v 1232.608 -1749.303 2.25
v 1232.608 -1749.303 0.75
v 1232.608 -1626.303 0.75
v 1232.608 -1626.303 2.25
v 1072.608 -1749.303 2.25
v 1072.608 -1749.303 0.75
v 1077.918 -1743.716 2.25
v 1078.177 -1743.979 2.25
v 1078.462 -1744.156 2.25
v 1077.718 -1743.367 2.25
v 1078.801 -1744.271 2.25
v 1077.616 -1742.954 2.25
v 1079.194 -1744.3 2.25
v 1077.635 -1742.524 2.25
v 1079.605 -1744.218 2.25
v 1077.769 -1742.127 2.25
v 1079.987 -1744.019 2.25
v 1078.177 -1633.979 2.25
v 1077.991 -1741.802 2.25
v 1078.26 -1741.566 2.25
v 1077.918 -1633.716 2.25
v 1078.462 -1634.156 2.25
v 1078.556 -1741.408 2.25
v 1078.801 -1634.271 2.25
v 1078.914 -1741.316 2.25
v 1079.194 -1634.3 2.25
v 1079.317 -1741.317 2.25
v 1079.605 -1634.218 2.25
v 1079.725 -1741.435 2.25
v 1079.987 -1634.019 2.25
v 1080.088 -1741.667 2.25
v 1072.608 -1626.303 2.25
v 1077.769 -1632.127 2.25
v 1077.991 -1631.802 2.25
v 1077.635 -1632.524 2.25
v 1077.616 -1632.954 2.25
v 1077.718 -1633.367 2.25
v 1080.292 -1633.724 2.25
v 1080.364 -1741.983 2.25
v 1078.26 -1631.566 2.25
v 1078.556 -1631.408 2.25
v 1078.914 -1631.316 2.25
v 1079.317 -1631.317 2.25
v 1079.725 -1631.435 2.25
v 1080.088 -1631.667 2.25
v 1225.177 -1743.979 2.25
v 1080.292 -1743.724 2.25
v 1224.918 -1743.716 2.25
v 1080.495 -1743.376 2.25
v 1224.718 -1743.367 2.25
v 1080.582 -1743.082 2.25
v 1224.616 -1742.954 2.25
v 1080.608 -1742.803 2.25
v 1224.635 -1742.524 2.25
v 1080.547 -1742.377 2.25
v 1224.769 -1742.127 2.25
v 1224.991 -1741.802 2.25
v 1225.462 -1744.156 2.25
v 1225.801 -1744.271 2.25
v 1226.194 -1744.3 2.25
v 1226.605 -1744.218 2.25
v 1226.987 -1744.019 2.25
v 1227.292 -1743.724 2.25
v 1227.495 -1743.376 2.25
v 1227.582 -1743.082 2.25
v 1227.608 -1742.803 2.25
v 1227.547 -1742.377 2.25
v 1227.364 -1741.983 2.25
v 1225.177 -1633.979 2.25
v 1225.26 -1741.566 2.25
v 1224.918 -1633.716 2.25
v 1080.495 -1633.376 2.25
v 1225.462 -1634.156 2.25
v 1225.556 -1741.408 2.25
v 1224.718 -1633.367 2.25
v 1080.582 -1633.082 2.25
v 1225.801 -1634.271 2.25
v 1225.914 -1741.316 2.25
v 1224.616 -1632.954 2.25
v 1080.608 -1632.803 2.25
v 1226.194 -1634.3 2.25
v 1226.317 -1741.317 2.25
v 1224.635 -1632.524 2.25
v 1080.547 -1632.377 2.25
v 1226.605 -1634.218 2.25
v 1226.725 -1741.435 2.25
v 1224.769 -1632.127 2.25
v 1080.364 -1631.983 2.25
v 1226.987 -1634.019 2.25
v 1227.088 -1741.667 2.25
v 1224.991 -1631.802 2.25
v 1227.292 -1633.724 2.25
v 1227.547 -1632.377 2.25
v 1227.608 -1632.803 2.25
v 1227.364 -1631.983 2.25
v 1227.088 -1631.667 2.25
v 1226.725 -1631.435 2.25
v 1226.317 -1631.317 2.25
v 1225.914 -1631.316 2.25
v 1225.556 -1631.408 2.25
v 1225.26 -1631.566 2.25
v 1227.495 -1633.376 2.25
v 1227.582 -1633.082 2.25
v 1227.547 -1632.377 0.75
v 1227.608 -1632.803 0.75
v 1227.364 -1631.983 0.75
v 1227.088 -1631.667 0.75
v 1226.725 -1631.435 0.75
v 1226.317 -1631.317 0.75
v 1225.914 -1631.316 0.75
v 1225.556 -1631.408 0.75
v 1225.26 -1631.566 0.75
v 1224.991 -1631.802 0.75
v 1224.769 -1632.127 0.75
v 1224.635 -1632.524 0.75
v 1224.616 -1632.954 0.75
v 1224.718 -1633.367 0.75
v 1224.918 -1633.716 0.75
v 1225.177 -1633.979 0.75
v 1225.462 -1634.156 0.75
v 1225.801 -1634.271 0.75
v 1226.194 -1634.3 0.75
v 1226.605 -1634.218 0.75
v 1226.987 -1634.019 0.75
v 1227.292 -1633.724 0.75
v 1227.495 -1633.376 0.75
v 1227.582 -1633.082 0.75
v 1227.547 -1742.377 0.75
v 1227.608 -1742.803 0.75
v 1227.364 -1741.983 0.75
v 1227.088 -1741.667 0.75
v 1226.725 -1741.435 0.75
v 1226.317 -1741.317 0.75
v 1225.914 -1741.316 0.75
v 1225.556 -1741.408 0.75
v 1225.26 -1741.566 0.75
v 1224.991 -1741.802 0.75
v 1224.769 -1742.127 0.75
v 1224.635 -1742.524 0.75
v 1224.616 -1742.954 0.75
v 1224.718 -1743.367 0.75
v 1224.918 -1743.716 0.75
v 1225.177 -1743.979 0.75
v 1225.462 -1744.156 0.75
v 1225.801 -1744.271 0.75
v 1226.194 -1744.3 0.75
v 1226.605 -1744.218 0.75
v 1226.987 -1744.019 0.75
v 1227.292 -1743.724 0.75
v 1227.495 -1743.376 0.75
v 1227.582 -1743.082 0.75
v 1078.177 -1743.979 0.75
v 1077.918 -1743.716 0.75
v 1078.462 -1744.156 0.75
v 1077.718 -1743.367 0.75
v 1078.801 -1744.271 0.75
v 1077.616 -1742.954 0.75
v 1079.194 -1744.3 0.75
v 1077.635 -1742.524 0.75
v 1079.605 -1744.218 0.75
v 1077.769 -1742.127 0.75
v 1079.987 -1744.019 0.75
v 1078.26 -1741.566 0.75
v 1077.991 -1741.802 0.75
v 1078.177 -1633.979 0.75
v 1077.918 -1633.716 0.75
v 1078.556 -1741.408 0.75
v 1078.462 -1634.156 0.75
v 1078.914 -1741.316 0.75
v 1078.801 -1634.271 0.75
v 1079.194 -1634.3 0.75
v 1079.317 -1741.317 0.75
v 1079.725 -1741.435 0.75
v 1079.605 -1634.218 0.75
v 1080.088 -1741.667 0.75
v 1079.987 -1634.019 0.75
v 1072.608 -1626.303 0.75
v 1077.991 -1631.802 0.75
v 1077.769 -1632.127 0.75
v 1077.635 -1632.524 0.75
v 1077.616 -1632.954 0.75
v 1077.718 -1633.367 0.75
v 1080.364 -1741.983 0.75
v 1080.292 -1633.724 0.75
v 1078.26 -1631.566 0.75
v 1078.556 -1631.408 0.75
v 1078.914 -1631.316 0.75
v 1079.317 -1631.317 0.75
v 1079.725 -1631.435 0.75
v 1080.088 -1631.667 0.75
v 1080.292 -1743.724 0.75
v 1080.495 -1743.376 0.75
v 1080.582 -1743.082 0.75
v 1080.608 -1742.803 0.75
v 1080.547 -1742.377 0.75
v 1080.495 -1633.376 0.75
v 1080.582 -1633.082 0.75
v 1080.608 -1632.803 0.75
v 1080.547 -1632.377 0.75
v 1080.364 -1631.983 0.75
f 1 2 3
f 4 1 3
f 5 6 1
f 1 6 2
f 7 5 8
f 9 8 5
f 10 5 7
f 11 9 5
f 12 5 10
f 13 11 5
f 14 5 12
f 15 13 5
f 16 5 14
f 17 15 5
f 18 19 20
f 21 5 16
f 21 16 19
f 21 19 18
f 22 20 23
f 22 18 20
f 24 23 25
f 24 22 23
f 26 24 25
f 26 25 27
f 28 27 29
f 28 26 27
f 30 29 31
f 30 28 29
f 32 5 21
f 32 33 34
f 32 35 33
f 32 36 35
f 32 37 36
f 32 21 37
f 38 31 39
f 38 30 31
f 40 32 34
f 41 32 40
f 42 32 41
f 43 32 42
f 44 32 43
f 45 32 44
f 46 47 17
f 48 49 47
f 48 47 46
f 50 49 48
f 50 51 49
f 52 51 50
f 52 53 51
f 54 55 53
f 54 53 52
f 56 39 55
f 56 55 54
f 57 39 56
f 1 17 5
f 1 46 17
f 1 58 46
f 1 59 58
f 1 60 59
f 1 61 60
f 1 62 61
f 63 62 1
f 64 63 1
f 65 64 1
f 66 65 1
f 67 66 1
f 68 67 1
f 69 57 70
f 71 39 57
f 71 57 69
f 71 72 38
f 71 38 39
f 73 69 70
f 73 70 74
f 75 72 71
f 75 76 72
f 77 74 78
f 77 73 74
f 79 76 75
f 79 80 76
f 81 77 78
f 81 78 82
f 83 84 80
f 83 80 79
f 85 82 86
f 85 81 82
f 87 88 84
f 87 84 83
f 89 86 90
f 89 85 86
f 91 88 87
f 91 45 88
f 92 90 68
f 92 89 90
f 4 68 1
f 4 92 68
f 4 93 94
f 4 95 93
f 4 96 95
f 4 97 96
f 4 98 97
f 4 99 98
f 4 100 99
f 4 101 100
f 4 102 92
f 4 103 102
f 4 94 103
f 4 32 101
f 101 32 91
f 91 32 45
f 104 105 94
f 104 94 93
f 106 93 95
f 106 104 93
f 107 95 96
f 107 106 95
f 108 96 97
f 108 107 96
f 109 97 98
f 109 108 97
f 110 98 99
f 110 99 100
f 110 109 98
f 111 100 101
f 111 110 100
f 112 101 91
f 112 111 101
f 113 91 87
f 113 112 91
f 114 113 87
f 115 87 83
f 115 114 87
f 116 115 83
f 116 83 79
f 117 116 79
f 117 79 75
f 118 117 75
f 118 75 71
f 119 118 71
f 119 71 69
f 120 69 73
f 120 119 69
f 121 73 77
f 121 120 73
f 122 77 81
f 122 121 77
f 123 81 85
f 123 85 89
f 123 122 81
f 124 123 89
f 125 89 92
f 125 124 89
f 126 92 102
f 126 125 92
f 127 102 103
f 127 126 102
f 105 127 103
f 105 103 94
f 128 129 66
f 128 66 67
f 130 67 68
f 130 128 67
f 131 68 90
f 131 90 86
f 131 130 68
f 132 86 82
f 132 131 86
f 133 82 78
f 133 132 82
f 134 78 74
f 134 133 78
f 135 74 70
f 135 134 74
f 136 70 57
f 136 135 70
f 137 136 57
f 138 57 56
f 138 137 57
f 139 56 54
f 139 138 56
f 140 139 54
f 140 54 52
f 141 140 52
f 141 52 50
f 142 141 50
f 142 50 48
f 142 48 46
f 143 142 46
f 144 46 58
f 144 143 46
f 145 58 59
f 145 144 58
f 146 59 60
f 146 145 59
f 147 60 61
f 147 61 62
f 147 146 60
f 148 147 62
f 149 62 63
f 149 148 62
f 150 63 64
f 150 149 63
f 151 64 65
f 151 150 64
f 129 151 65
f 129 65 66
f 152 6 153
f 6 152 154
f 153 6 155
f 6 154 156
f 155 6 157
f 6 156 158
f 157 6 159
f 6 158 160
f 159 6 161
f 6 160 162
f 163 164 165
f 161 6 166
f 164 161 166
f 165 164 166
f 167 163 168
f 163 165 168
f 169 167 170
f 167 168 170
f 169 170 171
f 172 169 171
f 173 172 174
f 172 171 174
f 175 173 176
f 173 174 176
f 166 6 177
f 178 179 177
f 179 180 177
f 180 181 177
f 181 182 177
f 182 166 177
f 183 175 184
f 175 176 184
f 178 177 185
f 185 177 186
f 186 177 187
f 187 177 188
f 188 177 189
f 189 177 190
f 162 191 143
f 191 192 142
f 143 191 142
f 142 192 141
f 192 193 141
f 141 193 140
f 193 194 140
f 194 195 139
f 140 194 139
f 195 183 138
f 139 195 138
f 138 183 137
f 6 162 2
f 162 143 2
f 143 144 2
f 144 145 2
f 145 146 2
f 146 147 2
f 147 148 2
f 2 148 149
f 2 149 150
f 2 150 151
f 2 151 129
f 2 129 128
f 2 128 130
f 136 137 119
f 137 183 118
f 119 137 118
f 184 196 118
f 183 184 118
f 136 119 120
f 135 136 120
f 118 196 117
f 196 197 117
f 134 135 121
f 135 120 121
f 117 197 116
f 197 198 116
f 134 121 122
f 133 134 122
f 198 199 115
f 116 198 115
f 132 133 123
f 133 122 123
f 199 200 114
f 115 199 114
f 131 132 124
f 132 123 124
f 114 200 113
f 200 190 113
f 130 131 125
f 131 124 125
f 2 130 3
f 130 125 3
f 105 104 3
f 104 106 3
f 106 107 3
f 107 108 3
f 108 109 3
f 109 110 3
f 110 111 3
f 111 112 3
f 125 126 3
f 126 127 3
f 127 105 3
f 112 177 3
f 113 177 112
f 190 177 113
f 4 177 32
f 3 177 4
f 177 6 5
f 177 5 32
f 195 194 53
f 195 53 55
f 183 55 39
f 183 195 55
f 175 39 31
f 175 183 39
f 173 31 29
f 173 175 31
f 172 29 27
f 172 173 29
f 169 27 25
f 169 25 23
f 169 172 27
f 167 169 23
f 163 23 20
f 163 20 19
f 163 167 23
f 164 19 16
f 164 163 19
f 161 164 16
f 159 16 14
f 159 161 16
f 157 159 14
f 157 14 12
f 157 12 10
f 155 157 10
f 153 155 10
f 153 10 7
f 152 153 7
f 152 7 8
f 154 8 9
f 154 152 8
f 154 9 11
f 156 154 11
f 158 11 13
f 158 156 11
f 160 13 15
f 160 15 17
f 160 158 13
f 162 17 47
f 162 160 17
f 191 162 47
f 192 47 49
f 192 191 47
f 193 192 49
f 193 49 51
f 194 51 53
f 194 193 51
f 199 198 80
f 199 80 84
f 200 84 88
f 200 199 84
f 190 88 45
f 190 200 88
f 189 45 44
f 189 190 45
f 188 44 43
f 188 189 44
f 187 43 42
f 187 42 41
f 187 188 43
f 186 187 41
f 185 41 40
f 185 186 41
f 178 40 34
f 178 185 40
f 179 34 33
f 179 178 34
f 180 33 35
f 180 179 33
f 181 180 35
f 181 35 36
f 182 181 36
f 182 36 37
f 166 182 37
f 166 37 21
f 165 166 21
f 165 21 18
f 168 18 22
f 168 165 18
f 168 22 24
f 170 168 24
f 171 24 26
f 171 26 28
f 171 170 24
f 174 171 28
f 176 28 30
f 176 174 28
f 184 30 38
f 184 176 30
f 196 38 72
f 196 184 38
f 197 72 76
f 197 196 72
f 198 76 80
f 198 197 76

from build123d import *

# Parameters (mm, degrees)
SKETCH_1_W      = 1600
SKETCH_1_H      = 1230
SKETCH_1_R      = 15
EXTRUDE_1_DEPTH = 3
SCALE_1_SCALE_X = 0.1
SCALE_1_SCALE_Y = 0.1
SCALE_1_SCALE_Z = 0.5


with BuildPart() as part:
    # 草图1 → 凸台-拉伸1 (new body)
    with BuildSketch(Plane.XY):
        with Locations((1152.60835314, -1687.80288964)):
            Rectangle(SKETCH_1_W, SKETCH_1_H)
        with Locations((417.60835314, -1137.80288964)):
            Circle(SKETCH_1_R, mode=Mode.SUBTRACT)
        with Locations((1887.60835314, -1137.80288964)):
            Circle(SKETCH_1_R, mode=Mode.SUBTRACT)
        with Locations((1887.60835314, -2237.80288964)):
            Circle(SKETCH_1_R, mode=Mode.SUBTRACT)
        with Locations((417.60835314, -2237.80288964)):
            Circle(SKETCH_1_R, mode=Mode.SUBTRACT)
    extrude(amount=EXTRUDE_1_DEPTH)


with BuildPart() as part_1:
    # 缩放比例1: scaled about (1152.60835314, -1687.80288964, 1.5)
    add(part.part.scale((SCALE_1_SCALE_X, SCALE_1_SCALE_Y, SCALE_1_SCALE_Z), about=(1152.60835314, -1687.80288964, 1.5)))


solid = part_1.part
